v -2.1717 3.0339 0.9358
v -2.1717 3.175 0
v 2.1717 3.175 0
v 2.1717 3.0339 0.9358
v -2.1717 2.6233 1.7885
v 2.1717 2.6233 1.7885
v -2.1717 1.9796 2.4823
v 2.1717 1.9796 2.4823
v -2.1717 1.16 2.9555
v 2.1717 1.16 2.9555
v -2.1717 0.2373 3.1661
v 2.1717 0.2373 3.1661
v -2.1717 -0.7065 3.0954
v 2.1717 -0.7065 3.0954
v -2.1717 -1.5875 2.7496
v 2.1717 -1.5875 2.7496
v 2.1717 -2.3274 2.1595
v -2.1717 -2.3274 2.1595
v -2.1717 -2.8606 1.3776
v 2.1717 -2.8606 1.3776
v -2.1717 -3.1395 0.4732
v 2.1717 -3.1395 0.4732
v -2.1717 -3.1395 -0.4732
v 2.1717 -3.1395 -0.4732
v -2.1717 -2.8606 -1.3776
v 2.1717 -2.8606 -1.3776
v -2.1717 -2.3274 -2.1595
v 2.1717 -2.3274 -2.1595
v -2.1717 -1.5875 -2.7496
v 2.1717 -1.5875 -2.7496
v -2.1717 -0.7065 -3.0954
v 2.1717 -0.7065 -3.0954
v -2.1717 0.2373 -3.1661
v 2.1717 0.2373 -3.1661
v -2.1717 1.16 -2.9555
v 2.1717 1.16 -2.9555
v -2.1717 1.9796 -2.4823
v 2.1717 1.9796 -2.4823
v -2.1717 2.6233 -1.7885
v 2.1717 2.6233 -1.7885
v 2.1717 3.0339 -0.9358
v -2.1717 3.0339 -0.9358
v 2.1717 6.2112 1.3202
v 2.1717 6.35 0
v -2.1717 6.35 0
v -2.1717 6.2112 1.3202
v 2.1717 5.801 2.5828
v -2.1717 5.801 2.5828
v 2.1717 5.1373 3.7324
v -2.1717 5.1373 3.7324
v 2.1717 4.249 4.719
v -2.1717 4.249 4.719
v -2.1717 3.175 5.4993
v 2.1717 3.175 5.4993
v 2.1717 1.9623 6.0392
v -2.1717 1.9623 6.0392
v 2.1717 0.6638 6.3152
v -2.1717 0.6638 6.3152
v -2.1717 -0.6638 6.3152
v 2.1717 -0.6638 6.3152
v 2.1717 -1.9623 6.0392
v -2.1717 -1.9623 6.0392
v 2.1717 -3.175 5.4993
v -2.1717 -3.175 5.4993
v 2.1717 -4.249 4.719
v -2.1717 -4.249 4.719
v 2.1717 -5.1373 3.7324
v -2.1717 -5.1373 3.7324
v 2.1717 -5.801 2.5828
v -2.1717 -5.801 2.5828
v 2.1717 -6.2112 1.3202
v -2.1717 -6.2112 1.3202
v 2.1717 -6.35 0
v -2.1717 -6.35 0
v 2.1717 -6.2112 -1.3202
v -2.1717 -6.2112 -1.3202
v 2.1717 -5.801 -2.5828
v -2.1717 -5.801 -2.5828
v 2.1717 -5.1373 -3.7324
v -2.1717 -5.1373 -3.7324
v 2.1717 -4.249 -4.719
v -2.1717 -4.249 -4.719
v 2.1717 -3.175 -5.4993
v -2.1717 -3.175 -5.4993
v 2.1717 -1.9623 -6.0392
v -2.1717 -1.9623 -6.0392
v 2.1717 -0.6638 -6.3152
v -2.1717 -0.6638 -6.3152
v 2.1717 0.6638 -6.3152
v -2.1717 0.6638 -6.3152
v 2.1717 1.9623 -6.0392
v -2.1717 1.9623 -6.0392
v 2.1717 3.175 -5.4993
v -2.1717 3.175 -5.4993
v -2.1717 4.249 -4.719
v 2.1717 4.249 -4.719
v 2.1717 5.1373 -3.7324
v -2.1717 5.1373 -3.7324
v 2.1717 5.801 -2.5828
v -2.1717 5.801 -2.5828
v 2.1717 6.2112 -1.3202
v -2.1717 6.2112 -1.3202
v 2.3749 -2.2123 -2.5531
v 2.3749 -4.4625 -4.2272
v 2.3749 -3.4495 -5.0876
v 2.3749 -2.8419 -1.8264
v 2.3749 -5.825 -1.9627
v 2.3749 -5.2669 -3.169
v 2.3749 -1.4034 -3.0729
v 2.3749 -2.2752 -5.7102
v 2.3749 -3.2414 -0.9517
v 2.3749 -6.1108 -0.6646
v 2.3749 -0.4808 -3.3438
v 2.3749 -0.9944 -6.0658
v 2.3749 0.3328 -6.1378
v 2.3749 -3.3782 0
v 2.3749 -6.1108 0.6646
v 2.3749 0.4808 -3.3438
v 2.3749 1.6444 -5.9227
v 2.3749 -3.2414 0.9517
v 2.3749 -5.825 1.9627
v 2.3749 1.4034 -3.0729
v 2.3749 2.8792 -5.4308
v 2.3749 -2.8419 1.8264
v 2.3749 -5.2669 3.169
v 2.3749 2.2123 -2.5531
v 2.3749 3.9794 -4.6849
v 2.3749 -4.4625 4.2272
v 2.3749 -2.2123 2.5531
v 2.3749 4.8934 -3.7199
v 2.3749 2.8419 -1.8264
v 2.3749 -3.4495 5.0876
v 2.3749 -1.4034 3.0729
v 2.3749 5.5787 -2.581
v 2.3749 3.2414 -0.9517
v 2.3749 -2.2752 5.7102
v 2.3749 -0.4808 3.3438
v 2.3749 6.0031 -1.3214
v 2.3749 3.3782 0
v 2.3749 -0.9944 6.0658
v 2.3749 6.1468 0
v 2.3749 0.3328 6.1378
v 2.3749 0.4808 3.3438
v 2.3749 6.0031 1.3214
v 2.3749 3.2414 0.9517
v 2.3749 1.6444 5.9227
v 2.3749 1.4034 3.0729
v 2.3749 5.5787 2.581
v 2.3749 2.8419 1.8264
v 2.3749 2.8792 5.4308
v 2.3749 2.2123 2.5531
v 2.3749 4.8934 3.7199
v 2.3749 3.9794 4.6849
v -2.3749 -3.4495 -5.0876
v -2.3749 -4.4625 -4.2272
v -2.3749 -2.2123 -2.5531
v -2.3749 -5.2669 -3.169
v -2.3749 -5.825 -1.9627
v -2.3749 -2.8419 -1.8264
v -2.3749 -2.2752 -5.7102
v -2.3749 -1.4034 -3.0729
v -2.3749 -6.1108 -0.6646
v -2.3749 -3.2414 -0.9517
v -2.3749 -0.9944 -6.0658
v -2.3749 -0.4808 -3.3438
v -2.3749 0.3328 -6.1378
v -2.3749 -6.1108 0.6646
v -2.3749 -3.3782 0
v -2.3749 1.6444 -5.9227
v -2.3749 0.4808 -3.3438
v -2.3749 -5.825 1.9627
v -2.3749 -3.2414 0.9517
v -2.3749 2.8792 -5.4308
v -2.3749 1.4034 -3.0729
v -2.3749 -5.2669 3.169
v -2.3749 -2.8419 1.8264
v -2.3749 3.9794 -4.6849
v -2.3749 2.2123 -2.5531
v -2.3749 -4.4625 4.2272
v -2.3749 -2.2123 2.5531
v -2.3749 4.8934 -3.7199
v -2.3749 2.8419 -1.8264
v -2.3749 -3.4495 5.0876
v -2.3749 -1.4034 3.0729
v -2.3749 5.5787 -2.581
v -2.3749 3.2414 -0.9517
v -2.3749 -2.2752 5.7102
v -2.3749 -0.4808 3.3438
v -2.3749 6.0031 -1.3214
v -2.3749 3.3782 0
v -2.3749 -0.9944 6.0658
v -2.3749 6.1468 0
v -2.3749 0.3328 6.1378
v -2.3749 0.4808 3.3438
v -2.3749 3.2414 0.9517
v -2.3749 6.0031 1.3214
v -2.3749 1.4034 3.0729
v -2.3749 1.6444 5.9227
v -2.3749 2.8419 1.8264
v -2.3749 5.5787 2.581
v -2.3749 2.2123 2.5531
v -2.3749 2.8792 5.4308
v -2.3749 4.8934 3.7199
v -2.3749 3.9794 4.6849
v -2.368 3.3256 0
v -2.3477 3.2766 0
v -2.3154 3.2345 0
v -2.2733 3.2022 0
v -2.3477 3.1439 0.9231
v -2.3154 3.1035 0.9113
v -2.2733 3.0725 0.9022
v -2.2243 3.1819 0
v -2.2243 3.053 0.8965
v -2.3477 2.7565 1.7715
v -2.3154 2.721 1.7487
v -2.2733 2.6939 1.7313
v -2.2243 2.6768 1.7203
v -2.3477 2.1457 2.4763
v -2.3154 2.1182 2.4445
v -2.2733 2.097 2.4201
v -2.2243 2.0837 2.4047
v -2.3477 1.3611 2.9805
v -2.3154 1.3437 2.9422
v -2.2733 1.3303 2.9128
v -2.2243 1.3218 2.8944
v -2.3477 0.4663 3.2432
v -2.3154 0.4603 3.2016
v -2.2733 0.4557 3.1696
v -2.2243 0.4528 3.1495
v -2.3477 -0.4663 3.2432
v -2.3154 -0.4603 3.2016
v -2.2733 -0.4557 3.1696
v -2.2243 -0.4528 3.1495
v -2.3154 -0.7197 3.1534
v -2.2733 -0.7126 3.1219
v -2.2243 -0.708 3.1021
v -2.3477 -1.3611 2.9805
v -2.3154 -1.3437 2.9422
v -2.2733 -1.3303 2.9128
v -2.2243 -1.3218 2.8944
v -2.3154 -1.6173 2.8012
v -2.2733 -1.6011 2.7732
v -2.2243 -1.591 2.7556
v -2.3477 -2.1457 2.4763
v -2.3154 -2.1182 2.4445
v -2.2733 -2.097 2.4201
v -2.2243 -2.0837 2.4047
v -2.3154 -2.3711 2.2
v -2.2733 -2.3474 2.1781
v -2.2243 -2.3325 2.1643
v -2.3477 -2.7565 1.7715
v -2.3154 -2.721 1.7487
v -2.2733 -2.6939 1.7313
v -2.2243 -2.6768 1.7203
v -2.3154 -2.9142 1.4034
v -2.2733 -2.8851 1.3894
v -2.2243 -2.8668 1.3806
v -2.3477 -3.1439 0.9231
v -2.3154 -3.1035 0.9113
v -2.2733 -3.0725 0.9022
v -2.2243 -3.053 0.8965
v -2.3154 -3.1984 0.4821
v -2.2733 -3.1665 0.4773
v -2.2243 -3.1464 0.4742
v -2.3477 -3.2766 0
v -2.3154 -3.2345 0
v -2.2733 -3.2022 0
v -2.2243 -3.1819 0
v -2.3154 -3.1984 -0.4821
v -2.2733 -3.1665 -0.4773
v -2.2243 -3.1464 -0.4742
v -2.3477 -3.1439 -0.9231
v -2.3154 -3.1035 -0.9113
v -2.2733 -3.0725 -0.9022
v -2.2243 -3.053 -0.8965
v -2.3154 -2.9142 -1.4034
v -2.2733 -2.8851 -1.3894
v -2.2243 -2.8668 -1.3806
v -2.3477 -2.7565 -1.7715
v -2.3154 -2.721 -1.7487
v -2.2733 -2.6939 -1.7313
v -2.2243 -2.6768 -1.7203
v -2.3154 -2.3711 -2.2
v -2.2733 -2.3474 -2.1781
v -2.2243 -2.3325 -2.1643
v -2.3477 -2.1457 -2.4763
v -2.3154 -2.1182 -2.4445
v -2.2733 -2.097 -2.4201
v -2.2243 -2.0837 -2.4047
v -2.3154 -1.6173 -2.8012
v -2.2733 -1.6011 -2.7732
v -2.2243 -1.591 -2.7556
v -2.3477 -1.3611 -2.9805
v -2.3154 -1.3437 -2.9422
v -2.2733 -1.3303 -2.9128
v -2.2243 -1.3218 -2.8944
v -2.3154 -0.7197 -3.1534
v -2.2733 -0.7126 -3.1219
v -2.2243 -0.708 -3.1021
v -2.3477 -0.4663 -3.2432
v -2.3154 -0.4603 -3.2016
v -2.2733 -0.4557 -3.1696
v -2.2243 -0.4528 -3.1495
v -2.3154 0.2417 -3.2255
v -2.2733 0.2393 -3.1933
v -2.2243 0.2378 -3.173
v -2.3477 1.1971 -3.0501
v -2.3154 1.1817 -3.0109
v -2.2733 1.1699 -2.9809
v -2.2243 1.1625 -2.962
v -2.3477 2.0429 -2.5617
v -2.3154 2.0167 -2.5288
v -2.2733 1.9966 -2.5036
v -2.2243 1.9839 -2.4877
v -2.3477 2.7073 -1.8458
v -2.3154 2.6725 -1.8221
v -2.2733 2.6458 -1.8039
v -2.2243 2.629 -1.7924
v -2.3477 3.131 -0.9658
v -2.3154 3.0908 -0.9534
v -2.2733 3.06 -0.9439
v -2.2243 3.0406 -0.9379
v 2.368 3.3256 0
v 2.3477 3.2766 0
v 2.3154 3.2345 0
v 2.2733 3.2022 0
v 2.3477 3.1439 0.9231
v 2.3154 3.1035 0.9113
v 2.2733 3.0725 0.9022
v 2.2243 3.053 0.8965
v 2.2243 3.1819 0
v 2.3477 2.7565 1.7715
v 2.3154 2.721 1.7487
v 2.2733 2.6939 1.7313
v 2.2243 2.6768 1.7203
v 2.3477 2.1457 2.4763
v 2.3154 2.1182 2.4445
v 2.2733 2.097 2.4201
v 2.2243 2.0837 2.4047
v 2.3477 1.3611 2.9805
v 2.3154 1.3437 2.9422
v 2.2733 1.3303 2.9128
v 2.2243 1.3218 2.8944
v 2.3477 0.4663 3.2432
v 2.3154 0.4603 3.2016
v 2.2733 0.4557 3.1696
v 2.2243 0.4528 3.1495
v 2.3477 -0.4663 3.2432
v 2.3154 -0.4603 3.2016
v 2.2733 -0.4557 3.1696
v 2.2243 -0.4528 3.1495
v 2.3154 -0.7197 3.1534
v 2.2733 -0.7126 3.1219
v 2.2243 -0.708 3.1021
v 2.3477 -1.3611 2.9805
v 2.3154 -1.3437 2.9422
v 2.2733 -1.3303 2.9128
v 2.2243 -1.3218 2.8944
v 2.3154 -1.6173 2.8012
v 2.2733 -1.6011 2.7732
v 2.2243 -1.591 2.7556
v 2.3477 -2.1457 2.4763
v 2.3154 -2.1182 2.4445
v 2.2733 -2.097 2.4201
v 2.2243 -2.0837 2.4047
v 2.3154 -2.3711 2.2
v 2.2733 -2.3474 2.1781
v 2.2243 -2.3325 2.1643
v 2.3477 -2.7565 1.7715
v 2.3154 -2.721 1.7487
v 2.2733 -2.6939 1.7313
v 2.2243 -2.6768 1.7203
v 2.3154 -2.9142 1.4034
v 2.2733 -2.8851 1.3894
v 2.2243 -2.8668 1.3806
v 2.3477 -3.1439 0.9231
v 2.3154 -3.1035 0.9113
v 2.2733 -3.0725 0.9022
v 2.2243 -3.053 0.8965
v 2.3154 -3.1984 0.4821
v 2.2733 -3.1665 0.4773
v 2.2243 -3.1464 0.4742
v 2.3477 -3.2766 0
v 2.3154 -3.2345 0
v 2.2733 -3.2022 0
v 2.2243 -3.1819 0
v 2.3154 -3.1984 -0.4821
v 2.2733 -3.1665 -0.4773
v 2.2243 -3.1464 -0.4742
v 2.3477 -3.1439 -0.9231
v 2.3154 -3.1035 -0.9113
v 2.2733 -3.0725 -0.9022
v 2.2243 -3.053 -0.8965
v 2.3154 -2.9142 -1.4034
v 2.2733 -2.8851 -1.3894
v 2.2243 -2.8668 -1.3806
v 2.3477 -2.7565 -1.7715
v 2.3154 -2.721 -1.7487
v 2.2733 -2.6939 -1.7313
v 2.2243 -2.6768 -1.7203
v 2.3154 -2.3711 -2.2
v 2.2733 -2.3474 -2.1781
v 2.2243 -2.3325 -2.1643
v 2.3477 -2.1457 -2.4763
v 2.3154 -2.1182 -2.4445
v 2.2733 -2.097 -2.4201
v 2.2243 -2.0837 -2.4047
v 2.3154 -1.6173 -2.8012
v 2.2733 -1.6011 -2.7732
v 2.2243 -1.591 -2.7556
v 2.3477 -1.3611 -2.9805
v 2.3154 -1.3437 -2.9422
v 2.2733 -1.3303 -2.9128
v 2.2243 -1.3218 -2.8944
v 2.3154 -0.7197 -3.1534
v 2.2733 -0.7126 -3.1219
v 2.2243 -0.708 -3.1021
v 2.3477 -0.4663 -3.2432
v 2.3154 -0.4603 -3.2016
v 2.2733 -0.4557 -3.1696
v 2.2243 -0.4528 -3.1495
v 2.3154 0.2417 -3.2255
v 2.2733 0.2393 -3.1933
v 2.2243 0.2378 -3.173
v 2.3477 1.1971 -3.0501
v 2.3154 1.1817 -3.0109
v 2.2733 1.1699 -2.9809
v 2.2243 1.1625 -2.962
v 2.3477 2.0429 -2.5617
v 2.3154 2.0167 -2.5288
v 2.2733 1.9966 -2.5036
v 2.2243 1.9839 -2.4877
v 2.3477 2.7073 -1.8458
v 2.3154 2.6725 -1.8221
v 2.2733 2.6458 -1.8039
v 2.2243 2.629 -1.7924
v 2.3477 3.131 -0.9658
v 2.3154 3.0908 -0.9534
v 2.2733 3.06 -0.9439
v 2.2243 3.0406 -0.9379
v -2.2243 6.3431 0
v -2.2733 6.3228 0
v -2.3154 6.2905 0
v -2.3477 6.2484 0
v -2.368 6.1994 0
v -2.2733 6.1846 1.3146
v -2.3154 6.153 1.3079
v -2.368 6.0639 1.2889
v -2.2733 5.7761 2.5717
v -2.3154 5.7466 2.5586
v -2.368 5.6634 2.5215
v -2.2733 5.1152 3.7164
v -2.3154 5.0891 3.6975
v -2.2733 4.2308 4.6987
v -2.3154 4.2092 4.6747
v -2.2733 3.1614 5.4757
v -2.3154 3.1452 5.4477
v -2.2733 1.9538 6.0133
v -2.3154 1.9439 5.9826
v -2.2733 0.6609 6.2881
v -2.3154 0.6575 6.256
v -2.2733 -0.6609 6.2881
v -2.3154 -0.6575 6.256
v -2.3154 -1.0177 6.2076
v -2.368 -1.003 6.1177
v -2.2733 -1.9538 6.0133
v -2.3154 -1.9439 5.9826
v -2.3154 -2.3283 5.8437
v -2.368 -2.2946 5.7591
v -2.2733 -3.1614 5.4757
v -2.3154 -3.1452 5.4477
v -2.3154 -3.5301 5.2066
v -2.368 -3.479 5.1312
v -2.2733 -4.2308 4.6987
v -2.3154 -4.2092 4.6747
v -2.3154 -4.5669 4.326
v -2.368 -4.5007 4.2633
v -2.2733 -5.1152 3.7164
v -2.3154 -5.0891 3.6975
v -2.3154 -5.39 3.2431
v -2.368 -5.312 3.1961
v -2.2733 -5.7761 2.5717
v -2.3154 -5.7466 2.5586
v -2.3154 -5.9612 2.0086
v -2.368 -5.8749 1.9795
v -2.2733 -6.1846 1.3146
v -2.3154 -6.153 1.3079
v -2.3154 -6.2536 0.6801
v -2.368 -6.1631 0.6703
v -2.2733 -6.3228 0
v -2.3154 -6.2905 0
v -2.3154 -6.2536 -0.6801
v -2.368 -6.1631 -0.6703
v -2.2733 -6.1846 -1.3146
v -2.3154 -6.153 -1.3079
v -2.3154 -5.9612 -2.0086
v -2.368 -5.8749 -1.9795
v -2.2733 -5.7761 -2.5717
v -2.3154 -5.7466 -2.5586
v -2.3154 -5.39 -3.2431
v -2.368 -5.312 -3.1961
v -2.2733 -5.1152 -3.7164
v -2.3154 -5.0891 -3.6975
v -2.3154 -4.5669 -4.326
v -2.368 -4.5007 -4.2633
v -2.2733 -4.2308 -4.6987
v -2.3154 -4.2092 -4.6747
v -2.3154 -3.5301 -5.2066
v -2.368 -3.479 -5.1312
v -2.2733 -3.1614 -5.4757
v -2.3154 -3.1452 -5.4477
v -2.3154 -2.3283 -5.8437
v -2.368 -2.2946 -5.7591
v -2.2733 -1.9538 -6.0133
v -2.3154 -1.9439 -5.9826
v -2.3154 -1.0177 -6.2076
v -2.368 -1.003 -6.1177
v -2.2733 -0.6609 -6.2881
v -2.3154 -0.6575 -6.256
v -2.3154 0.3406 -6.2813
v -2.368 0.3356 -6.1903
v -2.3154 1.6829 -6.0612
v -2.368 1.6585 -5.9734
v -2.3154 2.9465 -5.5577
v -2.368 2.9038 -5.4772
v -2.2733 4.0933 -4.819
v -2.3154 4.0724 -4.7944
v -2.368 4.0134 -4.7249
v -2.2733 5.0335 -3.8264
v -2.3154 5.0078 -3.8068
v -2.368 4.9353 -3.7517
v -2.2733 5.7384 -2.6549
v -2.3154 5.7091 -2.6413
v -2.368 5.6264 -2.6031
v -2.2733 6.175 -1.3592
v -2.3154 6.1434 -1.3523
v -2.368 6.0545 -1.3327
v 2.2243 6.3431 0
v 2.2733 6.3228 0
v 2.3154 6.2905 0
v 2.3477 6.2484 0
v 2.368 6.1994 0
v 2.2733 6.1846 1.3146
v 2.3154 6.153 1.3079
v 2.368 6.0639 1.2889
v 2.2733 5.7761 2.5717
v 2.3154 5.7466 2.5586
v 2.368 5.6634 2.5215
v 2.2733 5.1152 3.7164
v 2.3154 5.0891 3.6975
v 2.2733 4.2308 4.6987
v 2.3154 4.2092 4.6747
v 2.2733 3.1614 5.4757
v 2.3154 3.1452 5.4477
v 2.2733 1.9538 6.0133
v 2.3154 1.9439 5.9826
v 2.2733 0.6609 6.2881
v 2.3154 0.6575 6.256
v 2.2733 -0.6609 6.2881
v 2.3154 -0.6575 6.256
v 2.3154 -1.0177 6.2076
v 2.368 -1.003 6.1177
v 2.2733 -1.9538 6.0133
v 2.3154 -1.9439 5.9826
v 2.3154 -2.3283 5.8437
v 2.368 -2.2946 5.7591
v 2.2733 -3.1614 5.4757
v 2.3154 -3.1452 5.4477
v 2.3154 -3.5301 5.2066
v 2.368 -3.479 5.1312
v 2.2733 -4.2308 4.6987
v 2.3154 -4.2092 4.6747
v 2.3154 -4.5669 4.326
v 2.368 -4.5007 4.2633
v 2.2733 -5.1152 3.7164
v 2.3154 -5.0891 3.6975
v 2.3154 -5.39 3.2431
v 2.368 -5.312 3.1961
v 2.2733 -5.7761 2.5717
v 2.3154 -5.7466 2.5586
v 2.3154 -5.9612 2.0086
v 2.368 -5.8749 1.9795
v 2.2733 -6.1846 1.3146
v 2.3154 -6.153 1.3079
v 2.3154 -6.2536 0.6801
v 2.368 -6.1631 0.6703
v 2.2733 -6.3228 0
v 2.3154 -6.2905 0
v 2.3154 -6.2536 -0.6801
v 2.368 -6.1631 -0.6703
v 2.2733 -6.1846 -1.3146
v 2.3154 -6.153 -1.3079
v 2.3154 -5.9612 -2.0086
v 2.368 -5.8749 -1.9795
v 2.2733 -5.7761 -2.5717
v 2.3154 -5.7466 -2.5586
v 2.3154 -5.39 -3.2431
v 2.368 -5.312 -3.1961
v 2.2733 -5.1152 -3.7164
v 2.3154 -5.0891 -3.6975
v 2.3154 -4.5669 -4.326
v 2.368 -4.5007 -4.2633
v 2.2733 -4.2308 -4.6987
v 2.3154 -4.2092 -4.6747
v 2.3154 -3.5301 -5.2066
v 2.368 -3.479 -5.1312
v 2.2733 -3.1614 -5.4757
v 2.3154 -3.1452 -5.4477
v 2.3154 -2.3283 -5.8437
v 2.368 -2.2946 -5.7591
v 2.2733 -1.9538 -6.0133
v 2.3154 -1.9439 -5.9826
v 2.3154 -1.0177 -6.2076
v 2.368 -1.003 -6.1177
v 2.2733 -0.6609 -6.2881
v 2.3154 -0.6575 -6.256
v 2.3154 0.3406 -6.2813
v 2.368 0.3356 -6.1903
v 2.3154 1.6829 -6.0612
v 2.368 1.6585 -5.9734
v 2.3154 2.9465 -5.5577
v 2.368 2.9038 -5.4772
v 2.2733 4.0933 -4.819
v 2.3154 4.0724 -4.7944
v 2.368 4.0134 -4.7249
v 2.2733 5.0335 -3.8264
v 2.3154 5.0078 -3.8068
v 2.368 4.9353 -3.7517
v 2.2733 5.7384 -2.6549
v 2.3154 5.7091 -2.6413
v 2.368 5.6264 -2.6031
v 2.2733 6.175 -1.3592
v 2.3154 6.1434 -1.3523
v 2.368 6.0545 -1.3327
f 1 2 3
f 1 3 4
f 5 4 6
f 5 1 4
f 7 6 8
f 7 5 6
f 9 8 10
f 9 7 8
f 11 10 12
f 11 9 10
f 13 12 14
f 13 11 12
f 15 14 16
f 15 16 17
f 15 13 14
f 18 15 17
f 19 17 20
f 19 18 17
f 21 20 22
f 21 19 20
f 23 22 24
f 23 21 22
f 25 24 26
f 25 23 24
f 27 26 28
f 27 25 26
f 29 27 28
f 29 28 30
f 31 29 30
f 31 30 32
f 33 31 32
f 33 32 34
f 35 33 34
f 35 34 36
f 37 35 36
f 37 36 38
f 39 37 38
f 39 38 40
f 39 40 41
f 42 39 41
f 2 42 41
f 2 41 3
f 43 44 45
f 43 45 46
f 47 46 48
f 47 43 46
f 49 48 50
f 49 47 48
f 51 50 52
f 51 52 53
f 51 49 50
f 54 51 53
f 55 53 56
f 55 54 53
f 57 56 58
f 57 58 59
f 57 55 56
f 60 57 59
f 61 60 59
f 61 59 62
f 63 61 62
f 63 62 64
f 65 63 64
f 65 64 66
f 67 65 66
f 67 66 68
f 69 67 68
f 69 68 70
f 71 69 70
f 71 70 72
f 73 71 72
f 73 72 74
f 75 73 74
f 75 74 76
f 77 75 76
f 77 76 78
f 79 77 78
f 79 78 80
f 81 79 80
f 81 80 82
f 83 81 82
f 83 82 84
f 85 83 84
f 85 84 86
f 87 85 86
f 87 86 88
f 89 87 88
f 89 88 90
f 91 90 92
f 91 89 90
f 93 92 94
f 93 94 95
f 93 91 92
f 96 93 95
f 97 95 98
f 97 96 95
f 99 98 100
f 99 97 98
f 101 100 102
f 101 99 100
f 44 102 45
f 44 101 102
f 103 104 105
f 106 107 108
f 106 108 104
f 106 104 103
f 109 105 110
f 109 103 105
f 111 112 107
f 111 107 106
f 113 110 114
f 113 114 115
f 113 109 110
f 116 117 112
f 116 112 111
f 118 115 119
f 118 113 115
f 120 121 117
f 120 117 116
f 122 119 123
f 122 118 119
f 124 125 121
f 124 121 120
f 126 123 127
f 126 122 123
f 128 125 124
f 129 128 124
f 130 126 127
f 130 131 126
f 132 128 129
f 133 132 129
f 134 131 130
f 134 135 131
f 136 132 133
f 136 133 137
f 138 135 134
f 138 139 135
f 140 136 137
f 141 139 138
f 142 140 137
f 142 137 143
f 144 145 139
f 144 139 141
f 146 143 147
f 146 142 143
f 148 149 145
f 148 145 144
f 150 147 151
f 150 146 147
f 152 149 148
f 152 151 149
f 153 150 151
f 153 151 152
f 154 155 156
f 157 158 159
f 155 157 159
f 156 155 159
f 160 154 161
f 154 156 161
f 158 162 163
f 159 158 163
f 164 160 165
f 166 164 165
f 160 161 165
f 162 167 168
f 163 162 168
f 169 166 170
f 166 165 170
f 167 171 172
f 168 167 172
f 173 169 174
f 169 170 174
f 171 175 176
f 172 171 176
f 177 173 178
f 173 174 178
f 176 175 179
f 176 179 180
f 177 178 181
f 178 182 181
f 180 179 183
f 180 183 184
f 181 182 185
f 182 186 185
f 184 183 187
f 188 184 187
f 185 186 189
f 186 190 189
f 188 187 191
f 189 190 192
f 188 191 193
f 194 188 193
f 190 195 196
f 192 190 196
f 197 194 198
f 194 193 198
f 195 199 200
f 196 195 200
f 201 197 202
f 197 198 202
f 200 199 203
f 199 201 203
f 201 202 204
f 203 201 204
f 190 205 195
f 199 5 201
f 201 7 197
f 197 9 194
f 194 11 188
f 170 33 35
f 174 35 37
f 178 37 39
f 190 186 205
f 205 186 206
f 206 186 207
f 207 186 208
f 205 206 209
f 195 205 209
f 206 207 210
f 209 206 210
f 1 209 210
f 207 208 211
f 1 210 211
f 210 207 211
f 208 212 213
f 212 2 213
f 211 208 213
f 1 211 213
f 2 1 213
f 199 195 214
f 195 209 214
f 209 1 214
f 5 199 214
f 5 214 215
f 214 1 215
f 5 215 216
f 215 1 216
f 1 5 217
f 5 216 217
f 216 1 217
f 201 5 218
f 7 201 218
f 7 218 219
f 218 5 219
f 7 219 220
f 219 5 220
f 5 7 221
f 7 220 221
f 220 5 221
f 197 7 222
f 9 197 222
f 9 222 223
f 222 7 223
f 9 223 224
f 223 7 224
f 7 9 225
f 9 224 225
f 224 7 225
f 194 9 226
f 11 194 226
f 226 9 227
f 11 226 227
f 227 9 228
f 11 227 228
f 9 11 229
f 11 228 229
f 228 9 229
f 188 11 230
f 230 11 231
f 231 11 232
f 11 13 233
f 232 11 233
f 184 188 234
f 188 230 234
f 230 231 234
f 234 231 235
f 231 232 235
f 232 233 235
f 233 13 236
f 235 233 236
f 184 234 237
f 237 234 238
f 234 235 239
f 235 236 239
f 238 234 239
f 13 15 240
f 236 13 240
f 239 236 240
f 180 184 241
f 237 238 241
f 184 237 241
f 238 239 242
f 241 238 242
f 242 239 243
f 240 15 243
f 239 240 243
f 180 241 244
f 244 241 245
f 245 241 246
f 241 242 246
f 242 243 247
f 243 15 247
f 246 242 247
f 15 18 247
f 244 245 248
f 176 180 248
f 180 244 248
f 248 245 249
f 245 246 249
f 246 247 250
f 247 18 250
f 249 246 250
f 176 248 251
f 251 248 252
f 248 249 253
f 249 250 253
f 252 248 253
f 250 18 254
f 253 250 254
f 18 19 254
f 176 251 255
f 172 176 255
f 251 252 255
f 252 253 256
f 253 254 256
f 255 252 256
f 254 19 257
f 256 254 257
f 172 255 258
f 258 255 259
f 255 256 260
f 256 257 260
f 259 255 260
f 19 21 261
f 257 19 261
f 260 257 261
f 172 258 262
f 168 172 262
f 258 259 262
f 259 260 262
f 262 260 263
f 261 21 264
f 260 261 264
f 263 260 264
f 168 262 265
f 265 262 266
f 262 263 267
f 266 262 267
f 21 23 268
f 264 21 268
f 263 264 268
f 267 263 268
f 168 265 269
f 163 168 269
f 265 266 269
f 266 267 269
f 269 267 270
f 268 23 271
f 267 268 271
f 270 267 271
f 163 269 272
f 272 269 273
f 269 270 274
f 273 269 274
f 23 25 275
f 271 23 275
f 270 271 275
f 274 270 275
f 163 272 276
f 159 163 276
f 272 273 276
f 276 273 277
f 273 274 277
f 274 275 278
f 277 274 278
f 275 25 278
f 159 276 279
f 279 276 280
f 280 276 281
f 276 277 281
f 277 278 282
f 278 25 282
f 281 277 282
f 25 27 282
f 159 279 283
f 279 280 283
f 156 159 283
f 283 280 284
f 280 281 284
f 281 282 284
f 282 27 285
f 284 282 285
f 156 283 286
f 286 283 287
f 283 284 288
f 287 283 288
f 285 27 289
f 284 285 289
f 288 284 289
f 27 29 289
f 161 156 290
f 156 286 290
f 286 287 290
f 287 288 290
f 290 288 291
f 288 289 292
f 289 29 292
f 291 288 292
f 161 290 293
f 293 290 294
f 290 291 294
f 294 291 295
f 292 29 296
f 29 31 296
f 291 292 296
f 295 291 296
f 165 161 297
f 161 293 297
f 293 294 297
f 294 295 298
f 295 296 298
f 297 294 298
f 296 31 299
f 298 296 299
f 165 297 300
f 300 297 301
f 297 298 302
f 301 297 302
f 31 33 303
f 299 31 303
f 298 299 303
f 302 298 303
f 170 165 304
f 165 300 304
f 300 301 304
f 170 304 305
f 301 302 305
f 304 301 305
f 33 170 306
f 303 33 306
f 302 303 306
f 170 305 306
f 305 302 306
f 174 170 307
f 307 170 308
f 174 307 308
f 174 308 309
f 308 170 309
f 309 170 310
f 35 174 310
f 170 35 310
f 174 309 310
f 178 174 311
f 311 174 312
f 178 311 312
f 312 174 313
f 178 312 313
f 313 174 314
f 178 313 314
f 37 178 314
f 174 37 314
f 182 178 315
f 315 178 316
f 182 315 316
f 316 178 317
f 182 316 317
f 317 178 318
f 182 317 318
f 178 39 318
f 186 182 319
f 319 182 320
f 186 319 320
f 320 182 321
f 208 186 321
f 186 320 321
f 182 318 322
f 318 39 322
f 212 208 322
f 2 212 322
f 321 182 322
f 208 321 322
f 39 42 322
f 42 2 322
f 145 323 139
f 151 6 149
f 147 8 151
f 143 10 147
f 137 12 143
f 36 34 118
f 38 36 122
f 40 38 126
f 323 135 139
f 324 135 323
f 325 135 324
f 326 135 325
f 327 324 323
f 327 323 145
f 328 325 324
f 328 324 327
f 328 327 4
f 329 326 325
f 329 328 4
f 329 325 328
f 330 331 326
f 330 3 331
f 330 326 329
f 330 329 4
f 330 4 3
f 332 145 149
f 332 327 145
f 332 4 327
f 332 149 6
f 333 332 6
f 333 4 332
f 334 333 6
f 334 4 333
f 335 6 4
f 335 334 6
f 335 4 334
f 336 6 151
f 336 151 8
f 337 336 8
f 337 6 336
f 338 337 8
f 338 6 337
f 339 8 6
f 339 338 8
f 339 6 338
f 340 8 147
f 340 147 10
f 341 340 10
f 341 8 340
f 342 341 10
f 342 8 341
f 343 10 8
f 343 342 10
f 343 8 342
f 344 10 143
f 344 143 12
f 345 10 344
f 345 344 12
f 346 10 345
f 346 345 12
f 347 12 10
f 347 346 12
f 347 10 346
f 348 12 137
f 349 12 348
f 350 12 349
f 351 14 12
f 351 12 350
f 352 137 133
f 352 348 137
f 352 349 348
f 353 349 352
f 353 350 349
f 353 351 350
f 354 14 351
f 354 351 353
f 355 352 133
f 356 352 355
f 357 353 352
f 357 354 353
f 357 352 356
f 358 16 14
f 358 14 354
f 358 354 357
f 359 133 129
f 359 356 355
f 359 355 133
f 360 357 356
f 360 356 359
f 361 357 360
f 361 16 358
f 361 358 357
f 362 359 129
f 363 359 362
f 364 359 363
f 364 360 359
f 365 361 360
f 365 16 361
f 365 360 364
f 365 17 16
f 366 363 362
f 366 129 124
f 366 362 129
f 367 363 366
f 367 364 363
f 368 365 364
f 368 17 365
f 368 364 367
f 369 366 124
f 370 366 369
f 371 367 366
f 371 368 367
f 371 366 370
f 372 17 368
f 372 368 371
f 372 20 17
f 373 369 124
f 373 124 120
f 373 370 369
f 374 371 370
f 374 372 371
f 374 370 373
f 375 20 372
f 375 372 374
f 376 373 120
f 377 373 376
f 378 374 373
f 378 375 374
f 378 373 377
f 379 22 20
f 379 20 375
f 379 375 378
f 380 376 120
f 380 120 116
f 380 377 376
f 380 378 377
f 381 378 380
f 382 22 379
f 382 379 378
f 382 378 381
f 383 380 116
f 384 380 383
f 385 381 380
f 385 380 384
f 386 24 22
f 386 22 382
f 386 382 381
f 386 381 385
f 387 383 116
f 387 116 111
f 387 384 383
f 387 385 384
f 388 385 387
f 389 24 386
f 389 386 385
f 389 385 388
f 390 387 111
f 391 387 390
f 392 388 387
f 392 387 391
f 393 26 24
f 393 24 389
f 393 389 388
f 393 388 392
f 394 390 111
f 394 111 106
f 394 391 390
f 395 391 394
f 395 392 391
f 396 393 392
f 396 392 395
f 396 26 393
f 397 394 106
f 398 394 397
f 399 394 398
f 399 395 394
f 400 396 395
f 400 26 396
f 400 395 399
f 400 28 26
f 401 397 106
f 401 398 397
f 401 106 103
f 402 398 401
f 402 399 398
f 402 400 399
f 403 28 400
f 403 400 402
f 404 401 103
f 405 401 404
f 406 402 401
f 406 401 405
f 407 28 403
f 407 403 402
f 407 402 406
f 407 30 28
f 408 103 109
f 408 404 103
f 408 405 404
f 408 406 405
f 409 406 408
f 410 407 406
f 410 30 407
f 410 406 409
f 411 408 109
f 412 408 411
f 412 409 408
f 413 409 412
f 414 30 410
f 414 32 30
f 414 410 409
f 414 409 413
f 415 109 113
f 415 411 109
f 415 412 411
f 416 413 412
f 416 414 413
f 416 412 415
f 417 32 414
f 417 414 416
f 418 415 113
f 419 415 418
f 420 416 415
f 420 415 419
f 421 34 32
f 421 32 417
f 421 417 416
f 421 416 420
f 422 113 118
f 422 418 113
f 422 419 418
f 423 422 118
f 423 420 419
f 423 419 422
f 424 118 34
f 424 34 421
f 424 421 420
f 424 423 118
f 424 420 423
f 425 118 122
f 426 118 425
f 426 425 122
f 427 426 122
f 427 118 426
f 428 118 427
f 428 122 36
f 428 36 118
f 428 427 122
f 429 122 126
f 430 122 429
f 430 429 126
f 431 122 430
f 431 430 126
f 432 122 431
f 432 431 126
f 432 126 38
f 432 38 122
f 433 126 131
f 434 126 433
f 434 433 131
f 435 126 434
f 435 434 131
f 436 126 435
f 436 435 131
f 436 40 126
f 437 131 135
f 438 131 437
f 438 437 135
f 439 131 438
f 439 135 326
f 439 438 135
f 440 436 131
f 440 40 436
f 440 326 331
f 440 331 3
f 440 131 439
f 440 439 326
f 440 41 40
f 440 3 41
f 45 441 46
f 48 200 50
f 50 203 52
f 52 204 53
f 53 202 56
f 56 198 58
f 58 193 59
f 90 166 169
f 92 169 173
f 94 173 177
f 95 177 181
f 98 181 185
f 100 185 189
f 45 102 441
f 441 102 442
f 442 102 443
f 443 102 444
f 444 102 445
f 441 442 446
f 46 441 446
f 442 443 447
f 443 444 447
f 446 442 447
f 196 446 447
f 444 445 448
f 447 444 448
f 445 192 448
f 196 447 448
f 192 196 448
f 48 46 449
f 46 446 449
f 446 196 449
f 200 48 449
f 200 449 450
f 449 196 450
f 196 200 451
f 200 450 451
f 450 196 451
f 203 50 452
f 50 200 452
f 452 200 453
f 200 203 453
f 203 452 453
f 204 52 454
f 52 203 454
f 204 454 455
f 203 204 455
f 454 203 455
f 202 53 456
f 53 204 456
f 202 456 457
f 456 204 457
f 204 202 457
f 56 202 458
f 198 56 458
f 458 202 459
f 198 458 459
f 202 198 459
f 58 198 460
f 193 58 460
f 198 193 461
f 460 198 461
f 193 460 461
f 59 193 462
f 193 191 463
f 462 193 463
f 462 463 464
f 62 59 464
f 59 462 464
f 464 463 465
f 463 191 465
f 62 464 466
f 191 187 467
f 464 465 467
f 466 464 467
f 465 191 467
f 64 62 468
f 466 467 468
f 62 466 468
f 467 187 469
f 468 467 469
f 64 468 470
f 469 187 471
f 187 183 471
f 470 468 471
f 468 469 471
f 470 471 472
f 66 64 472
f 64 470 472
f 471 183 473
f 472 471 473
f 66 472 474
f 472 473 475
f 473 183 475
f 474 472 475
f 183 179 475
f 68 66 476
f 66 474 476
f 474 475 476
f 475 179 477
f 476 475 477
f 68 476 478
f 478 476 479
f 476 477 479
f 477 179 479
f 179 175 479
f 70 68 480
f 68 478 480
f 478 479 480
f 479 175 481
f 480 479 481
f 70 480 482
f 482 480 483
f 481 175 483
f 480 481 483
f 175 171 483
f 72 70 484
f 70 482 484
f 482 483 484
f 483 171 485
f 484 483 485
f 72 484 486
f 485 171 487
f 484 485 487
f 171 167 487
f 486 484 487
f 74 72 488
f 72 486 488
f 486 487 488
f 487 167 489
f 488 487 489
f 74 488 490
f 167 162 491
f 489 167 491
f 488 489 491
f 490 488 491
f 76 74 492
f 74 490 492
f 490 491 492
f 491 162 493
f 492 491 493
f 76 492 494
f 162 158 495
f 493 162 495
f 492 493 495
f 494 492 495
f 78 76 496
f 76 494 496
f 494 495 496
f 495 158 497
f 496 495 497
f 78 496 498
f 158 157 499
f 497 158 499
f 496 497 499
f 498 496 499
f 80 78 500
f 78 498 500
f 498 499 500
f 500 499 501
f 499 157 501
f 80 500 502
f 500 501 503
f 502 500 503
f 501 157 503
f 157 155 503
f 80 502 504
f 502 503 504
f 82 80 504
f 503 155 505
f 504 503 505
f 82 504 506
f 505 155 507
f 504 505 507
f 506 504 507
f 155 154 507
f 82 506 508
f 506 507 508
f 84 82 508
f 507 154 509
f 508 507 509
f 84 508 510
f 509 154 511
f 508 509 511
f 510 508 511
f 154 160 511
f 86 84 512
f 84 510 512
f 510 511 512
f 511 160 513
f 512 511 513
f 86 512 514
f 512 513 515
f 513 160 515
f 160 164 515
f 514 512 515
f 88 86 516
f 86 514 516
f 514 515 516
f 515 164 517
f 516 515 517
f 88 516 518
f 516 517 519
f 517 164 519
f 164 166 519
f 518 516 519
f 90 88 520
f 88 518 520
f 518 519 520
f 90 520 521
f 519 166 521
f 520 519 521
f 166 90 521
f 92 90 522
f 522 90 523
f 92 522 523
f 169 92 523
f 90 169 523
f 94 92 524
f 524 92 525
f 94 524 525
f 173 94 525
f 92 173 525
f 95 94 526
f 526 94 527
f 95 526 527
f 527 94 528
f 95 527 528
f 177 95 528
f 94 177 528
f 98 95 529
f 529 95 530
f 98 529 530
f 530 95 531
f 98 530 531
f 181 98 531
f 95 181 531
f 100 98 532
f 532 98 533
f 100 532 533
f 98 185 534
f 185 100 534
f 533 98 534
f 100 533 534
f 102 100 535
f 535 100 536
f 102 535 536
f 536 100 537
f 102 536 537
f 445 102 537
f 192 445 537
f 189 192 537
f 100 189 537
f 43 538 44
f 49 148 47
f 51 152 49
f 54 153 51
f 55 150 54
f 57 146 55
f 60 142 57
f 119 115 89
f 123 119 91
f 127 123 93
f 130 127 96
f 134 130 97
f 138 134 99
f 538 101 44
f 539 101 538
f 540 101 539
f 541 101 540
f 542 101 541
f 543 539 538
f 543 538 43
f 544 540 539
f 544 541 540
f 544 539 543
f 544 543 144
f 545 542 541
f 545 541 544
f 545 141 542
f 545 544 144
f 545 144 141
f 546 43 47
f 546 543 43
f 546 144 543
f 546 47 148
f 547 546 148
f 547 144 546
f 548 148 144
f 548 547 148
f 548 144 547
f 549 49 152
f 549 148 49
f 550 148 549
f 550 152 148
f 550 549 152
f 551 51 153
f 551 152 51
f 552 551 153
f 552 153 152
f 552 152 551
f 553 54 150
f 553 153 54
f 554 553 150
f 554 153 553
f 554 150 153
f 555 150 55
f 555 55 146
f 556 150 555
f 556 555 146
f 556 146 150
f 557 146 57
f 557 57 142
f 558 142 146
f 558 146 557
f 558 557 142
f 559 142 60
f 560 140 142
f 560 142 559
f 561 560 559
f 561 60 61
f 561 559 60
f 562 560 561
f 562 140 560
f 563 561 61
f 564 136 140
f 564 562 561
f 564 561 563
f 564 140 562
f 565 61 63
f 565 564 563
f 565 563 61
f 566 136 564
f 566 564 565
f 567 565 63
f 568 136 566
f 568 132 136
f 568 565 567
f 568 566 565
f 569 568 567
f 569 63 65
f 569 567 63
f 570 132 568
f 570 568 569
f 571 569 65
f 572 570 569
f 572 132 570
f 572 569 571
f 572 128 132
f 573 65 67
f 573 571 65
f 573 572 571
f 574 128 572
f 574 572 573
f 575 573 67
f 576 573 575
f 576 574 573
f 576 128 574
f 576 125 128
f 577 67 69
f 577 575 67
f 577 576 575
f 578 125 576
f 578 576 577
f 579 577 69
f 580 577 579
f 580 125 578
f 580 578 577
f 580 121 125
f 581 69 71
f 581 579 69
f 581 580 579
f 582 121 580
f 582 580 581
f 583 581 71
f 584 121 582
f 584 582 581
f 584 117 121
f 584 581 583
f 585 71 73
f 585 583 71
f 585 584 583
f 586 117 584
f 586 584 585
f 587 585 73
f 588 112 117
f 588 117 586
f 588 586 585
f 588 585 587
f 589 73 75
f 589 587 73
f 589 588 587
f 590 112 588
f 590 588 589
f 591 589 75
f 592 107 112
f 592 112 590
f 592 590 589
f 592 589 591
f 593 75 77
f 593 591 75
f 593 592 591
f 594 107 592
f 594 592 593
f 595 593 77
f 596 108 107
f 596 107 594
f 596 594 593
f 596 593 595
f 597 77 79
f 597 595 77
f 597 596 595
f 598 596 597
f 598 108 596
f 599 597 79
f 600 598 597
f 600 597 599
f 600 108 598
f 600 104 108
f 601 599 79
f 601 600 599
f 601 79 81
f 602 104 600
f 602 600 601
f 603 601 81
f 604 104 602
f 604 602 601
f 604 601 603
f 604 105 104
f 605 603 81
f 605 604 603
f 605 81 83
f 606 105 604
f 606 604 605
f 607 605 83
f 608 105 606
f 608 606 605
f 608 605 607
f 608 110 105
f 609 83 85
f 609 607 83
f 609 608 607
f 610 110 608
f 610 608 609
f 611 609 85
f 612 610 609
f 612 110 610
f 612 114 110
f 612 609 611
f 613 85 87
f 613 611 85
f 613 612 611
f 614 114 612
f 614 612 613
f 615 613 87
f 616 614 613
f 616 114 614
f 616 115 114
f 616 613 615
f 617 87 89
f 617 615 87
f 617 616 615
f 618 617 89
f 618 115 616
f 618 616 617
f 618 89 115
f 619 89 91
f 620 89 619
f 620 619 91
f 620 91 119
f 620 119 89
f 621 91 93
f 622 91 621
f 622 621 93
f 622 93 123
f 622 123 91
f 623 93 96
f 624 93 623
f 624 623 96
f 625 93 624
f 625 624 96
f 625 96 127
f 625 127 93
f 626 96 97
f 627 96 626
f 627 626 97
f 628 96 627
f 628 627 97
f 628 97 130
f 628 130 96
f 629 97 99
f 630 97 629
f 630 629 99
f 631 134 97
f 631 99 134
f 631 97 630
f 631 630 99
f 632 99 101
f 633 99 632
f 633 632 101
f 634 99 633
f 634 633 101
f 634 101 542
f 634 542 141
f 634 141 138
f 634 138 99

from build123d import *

# Parameters (mm, degrees)
F0_R     = 6.35
F0_R_2   = 3.175
F1_DEPTH = 2.3749
F2_R     = 0.2032
F3_R     = 0.2032
F4_R     = 0.2032
F5_R     = 0.2032


with BuildPart() as f1:
    # F0 (on Right) → F1 (new body, symmetric)
    with BuildSketch(Plane.YZ):
        Circle(F0_R)
        Circle(F0_R_2, mode=Mode.SUBTRACT)
    extrude(amount=F1_DEPTH, both=True)

    # F2
    f2_edges = [f1.edges().sort_by_distance(p)[0] for p in [
        (2.3749, -6.35, 0),
    ]]
    fillet(f2_edges, radius=F2_R)

    # F3
    f3_edges = [f1.edges().sort_by_distance(p)[0] for p in [
        (2.3749, -3.175, 0),
    ]]
    fillet(f3_edges, radius=F3_R)

    # F4
    f4_edges = [f1.edges().sort_by_distance(p)[0] for p in [
        (-2.3749, -6.35, 0),
    ]]
    fillet(f4_edges, radius=F4_R)

    # F5
    f5_edges = [f1.edges().sort_by_distance(p)[0] for p in [
        (-2.3749, -3.175, 0),
    ]]
    fillet(f5_edges, radius=F5_R)


solid = f1.part
